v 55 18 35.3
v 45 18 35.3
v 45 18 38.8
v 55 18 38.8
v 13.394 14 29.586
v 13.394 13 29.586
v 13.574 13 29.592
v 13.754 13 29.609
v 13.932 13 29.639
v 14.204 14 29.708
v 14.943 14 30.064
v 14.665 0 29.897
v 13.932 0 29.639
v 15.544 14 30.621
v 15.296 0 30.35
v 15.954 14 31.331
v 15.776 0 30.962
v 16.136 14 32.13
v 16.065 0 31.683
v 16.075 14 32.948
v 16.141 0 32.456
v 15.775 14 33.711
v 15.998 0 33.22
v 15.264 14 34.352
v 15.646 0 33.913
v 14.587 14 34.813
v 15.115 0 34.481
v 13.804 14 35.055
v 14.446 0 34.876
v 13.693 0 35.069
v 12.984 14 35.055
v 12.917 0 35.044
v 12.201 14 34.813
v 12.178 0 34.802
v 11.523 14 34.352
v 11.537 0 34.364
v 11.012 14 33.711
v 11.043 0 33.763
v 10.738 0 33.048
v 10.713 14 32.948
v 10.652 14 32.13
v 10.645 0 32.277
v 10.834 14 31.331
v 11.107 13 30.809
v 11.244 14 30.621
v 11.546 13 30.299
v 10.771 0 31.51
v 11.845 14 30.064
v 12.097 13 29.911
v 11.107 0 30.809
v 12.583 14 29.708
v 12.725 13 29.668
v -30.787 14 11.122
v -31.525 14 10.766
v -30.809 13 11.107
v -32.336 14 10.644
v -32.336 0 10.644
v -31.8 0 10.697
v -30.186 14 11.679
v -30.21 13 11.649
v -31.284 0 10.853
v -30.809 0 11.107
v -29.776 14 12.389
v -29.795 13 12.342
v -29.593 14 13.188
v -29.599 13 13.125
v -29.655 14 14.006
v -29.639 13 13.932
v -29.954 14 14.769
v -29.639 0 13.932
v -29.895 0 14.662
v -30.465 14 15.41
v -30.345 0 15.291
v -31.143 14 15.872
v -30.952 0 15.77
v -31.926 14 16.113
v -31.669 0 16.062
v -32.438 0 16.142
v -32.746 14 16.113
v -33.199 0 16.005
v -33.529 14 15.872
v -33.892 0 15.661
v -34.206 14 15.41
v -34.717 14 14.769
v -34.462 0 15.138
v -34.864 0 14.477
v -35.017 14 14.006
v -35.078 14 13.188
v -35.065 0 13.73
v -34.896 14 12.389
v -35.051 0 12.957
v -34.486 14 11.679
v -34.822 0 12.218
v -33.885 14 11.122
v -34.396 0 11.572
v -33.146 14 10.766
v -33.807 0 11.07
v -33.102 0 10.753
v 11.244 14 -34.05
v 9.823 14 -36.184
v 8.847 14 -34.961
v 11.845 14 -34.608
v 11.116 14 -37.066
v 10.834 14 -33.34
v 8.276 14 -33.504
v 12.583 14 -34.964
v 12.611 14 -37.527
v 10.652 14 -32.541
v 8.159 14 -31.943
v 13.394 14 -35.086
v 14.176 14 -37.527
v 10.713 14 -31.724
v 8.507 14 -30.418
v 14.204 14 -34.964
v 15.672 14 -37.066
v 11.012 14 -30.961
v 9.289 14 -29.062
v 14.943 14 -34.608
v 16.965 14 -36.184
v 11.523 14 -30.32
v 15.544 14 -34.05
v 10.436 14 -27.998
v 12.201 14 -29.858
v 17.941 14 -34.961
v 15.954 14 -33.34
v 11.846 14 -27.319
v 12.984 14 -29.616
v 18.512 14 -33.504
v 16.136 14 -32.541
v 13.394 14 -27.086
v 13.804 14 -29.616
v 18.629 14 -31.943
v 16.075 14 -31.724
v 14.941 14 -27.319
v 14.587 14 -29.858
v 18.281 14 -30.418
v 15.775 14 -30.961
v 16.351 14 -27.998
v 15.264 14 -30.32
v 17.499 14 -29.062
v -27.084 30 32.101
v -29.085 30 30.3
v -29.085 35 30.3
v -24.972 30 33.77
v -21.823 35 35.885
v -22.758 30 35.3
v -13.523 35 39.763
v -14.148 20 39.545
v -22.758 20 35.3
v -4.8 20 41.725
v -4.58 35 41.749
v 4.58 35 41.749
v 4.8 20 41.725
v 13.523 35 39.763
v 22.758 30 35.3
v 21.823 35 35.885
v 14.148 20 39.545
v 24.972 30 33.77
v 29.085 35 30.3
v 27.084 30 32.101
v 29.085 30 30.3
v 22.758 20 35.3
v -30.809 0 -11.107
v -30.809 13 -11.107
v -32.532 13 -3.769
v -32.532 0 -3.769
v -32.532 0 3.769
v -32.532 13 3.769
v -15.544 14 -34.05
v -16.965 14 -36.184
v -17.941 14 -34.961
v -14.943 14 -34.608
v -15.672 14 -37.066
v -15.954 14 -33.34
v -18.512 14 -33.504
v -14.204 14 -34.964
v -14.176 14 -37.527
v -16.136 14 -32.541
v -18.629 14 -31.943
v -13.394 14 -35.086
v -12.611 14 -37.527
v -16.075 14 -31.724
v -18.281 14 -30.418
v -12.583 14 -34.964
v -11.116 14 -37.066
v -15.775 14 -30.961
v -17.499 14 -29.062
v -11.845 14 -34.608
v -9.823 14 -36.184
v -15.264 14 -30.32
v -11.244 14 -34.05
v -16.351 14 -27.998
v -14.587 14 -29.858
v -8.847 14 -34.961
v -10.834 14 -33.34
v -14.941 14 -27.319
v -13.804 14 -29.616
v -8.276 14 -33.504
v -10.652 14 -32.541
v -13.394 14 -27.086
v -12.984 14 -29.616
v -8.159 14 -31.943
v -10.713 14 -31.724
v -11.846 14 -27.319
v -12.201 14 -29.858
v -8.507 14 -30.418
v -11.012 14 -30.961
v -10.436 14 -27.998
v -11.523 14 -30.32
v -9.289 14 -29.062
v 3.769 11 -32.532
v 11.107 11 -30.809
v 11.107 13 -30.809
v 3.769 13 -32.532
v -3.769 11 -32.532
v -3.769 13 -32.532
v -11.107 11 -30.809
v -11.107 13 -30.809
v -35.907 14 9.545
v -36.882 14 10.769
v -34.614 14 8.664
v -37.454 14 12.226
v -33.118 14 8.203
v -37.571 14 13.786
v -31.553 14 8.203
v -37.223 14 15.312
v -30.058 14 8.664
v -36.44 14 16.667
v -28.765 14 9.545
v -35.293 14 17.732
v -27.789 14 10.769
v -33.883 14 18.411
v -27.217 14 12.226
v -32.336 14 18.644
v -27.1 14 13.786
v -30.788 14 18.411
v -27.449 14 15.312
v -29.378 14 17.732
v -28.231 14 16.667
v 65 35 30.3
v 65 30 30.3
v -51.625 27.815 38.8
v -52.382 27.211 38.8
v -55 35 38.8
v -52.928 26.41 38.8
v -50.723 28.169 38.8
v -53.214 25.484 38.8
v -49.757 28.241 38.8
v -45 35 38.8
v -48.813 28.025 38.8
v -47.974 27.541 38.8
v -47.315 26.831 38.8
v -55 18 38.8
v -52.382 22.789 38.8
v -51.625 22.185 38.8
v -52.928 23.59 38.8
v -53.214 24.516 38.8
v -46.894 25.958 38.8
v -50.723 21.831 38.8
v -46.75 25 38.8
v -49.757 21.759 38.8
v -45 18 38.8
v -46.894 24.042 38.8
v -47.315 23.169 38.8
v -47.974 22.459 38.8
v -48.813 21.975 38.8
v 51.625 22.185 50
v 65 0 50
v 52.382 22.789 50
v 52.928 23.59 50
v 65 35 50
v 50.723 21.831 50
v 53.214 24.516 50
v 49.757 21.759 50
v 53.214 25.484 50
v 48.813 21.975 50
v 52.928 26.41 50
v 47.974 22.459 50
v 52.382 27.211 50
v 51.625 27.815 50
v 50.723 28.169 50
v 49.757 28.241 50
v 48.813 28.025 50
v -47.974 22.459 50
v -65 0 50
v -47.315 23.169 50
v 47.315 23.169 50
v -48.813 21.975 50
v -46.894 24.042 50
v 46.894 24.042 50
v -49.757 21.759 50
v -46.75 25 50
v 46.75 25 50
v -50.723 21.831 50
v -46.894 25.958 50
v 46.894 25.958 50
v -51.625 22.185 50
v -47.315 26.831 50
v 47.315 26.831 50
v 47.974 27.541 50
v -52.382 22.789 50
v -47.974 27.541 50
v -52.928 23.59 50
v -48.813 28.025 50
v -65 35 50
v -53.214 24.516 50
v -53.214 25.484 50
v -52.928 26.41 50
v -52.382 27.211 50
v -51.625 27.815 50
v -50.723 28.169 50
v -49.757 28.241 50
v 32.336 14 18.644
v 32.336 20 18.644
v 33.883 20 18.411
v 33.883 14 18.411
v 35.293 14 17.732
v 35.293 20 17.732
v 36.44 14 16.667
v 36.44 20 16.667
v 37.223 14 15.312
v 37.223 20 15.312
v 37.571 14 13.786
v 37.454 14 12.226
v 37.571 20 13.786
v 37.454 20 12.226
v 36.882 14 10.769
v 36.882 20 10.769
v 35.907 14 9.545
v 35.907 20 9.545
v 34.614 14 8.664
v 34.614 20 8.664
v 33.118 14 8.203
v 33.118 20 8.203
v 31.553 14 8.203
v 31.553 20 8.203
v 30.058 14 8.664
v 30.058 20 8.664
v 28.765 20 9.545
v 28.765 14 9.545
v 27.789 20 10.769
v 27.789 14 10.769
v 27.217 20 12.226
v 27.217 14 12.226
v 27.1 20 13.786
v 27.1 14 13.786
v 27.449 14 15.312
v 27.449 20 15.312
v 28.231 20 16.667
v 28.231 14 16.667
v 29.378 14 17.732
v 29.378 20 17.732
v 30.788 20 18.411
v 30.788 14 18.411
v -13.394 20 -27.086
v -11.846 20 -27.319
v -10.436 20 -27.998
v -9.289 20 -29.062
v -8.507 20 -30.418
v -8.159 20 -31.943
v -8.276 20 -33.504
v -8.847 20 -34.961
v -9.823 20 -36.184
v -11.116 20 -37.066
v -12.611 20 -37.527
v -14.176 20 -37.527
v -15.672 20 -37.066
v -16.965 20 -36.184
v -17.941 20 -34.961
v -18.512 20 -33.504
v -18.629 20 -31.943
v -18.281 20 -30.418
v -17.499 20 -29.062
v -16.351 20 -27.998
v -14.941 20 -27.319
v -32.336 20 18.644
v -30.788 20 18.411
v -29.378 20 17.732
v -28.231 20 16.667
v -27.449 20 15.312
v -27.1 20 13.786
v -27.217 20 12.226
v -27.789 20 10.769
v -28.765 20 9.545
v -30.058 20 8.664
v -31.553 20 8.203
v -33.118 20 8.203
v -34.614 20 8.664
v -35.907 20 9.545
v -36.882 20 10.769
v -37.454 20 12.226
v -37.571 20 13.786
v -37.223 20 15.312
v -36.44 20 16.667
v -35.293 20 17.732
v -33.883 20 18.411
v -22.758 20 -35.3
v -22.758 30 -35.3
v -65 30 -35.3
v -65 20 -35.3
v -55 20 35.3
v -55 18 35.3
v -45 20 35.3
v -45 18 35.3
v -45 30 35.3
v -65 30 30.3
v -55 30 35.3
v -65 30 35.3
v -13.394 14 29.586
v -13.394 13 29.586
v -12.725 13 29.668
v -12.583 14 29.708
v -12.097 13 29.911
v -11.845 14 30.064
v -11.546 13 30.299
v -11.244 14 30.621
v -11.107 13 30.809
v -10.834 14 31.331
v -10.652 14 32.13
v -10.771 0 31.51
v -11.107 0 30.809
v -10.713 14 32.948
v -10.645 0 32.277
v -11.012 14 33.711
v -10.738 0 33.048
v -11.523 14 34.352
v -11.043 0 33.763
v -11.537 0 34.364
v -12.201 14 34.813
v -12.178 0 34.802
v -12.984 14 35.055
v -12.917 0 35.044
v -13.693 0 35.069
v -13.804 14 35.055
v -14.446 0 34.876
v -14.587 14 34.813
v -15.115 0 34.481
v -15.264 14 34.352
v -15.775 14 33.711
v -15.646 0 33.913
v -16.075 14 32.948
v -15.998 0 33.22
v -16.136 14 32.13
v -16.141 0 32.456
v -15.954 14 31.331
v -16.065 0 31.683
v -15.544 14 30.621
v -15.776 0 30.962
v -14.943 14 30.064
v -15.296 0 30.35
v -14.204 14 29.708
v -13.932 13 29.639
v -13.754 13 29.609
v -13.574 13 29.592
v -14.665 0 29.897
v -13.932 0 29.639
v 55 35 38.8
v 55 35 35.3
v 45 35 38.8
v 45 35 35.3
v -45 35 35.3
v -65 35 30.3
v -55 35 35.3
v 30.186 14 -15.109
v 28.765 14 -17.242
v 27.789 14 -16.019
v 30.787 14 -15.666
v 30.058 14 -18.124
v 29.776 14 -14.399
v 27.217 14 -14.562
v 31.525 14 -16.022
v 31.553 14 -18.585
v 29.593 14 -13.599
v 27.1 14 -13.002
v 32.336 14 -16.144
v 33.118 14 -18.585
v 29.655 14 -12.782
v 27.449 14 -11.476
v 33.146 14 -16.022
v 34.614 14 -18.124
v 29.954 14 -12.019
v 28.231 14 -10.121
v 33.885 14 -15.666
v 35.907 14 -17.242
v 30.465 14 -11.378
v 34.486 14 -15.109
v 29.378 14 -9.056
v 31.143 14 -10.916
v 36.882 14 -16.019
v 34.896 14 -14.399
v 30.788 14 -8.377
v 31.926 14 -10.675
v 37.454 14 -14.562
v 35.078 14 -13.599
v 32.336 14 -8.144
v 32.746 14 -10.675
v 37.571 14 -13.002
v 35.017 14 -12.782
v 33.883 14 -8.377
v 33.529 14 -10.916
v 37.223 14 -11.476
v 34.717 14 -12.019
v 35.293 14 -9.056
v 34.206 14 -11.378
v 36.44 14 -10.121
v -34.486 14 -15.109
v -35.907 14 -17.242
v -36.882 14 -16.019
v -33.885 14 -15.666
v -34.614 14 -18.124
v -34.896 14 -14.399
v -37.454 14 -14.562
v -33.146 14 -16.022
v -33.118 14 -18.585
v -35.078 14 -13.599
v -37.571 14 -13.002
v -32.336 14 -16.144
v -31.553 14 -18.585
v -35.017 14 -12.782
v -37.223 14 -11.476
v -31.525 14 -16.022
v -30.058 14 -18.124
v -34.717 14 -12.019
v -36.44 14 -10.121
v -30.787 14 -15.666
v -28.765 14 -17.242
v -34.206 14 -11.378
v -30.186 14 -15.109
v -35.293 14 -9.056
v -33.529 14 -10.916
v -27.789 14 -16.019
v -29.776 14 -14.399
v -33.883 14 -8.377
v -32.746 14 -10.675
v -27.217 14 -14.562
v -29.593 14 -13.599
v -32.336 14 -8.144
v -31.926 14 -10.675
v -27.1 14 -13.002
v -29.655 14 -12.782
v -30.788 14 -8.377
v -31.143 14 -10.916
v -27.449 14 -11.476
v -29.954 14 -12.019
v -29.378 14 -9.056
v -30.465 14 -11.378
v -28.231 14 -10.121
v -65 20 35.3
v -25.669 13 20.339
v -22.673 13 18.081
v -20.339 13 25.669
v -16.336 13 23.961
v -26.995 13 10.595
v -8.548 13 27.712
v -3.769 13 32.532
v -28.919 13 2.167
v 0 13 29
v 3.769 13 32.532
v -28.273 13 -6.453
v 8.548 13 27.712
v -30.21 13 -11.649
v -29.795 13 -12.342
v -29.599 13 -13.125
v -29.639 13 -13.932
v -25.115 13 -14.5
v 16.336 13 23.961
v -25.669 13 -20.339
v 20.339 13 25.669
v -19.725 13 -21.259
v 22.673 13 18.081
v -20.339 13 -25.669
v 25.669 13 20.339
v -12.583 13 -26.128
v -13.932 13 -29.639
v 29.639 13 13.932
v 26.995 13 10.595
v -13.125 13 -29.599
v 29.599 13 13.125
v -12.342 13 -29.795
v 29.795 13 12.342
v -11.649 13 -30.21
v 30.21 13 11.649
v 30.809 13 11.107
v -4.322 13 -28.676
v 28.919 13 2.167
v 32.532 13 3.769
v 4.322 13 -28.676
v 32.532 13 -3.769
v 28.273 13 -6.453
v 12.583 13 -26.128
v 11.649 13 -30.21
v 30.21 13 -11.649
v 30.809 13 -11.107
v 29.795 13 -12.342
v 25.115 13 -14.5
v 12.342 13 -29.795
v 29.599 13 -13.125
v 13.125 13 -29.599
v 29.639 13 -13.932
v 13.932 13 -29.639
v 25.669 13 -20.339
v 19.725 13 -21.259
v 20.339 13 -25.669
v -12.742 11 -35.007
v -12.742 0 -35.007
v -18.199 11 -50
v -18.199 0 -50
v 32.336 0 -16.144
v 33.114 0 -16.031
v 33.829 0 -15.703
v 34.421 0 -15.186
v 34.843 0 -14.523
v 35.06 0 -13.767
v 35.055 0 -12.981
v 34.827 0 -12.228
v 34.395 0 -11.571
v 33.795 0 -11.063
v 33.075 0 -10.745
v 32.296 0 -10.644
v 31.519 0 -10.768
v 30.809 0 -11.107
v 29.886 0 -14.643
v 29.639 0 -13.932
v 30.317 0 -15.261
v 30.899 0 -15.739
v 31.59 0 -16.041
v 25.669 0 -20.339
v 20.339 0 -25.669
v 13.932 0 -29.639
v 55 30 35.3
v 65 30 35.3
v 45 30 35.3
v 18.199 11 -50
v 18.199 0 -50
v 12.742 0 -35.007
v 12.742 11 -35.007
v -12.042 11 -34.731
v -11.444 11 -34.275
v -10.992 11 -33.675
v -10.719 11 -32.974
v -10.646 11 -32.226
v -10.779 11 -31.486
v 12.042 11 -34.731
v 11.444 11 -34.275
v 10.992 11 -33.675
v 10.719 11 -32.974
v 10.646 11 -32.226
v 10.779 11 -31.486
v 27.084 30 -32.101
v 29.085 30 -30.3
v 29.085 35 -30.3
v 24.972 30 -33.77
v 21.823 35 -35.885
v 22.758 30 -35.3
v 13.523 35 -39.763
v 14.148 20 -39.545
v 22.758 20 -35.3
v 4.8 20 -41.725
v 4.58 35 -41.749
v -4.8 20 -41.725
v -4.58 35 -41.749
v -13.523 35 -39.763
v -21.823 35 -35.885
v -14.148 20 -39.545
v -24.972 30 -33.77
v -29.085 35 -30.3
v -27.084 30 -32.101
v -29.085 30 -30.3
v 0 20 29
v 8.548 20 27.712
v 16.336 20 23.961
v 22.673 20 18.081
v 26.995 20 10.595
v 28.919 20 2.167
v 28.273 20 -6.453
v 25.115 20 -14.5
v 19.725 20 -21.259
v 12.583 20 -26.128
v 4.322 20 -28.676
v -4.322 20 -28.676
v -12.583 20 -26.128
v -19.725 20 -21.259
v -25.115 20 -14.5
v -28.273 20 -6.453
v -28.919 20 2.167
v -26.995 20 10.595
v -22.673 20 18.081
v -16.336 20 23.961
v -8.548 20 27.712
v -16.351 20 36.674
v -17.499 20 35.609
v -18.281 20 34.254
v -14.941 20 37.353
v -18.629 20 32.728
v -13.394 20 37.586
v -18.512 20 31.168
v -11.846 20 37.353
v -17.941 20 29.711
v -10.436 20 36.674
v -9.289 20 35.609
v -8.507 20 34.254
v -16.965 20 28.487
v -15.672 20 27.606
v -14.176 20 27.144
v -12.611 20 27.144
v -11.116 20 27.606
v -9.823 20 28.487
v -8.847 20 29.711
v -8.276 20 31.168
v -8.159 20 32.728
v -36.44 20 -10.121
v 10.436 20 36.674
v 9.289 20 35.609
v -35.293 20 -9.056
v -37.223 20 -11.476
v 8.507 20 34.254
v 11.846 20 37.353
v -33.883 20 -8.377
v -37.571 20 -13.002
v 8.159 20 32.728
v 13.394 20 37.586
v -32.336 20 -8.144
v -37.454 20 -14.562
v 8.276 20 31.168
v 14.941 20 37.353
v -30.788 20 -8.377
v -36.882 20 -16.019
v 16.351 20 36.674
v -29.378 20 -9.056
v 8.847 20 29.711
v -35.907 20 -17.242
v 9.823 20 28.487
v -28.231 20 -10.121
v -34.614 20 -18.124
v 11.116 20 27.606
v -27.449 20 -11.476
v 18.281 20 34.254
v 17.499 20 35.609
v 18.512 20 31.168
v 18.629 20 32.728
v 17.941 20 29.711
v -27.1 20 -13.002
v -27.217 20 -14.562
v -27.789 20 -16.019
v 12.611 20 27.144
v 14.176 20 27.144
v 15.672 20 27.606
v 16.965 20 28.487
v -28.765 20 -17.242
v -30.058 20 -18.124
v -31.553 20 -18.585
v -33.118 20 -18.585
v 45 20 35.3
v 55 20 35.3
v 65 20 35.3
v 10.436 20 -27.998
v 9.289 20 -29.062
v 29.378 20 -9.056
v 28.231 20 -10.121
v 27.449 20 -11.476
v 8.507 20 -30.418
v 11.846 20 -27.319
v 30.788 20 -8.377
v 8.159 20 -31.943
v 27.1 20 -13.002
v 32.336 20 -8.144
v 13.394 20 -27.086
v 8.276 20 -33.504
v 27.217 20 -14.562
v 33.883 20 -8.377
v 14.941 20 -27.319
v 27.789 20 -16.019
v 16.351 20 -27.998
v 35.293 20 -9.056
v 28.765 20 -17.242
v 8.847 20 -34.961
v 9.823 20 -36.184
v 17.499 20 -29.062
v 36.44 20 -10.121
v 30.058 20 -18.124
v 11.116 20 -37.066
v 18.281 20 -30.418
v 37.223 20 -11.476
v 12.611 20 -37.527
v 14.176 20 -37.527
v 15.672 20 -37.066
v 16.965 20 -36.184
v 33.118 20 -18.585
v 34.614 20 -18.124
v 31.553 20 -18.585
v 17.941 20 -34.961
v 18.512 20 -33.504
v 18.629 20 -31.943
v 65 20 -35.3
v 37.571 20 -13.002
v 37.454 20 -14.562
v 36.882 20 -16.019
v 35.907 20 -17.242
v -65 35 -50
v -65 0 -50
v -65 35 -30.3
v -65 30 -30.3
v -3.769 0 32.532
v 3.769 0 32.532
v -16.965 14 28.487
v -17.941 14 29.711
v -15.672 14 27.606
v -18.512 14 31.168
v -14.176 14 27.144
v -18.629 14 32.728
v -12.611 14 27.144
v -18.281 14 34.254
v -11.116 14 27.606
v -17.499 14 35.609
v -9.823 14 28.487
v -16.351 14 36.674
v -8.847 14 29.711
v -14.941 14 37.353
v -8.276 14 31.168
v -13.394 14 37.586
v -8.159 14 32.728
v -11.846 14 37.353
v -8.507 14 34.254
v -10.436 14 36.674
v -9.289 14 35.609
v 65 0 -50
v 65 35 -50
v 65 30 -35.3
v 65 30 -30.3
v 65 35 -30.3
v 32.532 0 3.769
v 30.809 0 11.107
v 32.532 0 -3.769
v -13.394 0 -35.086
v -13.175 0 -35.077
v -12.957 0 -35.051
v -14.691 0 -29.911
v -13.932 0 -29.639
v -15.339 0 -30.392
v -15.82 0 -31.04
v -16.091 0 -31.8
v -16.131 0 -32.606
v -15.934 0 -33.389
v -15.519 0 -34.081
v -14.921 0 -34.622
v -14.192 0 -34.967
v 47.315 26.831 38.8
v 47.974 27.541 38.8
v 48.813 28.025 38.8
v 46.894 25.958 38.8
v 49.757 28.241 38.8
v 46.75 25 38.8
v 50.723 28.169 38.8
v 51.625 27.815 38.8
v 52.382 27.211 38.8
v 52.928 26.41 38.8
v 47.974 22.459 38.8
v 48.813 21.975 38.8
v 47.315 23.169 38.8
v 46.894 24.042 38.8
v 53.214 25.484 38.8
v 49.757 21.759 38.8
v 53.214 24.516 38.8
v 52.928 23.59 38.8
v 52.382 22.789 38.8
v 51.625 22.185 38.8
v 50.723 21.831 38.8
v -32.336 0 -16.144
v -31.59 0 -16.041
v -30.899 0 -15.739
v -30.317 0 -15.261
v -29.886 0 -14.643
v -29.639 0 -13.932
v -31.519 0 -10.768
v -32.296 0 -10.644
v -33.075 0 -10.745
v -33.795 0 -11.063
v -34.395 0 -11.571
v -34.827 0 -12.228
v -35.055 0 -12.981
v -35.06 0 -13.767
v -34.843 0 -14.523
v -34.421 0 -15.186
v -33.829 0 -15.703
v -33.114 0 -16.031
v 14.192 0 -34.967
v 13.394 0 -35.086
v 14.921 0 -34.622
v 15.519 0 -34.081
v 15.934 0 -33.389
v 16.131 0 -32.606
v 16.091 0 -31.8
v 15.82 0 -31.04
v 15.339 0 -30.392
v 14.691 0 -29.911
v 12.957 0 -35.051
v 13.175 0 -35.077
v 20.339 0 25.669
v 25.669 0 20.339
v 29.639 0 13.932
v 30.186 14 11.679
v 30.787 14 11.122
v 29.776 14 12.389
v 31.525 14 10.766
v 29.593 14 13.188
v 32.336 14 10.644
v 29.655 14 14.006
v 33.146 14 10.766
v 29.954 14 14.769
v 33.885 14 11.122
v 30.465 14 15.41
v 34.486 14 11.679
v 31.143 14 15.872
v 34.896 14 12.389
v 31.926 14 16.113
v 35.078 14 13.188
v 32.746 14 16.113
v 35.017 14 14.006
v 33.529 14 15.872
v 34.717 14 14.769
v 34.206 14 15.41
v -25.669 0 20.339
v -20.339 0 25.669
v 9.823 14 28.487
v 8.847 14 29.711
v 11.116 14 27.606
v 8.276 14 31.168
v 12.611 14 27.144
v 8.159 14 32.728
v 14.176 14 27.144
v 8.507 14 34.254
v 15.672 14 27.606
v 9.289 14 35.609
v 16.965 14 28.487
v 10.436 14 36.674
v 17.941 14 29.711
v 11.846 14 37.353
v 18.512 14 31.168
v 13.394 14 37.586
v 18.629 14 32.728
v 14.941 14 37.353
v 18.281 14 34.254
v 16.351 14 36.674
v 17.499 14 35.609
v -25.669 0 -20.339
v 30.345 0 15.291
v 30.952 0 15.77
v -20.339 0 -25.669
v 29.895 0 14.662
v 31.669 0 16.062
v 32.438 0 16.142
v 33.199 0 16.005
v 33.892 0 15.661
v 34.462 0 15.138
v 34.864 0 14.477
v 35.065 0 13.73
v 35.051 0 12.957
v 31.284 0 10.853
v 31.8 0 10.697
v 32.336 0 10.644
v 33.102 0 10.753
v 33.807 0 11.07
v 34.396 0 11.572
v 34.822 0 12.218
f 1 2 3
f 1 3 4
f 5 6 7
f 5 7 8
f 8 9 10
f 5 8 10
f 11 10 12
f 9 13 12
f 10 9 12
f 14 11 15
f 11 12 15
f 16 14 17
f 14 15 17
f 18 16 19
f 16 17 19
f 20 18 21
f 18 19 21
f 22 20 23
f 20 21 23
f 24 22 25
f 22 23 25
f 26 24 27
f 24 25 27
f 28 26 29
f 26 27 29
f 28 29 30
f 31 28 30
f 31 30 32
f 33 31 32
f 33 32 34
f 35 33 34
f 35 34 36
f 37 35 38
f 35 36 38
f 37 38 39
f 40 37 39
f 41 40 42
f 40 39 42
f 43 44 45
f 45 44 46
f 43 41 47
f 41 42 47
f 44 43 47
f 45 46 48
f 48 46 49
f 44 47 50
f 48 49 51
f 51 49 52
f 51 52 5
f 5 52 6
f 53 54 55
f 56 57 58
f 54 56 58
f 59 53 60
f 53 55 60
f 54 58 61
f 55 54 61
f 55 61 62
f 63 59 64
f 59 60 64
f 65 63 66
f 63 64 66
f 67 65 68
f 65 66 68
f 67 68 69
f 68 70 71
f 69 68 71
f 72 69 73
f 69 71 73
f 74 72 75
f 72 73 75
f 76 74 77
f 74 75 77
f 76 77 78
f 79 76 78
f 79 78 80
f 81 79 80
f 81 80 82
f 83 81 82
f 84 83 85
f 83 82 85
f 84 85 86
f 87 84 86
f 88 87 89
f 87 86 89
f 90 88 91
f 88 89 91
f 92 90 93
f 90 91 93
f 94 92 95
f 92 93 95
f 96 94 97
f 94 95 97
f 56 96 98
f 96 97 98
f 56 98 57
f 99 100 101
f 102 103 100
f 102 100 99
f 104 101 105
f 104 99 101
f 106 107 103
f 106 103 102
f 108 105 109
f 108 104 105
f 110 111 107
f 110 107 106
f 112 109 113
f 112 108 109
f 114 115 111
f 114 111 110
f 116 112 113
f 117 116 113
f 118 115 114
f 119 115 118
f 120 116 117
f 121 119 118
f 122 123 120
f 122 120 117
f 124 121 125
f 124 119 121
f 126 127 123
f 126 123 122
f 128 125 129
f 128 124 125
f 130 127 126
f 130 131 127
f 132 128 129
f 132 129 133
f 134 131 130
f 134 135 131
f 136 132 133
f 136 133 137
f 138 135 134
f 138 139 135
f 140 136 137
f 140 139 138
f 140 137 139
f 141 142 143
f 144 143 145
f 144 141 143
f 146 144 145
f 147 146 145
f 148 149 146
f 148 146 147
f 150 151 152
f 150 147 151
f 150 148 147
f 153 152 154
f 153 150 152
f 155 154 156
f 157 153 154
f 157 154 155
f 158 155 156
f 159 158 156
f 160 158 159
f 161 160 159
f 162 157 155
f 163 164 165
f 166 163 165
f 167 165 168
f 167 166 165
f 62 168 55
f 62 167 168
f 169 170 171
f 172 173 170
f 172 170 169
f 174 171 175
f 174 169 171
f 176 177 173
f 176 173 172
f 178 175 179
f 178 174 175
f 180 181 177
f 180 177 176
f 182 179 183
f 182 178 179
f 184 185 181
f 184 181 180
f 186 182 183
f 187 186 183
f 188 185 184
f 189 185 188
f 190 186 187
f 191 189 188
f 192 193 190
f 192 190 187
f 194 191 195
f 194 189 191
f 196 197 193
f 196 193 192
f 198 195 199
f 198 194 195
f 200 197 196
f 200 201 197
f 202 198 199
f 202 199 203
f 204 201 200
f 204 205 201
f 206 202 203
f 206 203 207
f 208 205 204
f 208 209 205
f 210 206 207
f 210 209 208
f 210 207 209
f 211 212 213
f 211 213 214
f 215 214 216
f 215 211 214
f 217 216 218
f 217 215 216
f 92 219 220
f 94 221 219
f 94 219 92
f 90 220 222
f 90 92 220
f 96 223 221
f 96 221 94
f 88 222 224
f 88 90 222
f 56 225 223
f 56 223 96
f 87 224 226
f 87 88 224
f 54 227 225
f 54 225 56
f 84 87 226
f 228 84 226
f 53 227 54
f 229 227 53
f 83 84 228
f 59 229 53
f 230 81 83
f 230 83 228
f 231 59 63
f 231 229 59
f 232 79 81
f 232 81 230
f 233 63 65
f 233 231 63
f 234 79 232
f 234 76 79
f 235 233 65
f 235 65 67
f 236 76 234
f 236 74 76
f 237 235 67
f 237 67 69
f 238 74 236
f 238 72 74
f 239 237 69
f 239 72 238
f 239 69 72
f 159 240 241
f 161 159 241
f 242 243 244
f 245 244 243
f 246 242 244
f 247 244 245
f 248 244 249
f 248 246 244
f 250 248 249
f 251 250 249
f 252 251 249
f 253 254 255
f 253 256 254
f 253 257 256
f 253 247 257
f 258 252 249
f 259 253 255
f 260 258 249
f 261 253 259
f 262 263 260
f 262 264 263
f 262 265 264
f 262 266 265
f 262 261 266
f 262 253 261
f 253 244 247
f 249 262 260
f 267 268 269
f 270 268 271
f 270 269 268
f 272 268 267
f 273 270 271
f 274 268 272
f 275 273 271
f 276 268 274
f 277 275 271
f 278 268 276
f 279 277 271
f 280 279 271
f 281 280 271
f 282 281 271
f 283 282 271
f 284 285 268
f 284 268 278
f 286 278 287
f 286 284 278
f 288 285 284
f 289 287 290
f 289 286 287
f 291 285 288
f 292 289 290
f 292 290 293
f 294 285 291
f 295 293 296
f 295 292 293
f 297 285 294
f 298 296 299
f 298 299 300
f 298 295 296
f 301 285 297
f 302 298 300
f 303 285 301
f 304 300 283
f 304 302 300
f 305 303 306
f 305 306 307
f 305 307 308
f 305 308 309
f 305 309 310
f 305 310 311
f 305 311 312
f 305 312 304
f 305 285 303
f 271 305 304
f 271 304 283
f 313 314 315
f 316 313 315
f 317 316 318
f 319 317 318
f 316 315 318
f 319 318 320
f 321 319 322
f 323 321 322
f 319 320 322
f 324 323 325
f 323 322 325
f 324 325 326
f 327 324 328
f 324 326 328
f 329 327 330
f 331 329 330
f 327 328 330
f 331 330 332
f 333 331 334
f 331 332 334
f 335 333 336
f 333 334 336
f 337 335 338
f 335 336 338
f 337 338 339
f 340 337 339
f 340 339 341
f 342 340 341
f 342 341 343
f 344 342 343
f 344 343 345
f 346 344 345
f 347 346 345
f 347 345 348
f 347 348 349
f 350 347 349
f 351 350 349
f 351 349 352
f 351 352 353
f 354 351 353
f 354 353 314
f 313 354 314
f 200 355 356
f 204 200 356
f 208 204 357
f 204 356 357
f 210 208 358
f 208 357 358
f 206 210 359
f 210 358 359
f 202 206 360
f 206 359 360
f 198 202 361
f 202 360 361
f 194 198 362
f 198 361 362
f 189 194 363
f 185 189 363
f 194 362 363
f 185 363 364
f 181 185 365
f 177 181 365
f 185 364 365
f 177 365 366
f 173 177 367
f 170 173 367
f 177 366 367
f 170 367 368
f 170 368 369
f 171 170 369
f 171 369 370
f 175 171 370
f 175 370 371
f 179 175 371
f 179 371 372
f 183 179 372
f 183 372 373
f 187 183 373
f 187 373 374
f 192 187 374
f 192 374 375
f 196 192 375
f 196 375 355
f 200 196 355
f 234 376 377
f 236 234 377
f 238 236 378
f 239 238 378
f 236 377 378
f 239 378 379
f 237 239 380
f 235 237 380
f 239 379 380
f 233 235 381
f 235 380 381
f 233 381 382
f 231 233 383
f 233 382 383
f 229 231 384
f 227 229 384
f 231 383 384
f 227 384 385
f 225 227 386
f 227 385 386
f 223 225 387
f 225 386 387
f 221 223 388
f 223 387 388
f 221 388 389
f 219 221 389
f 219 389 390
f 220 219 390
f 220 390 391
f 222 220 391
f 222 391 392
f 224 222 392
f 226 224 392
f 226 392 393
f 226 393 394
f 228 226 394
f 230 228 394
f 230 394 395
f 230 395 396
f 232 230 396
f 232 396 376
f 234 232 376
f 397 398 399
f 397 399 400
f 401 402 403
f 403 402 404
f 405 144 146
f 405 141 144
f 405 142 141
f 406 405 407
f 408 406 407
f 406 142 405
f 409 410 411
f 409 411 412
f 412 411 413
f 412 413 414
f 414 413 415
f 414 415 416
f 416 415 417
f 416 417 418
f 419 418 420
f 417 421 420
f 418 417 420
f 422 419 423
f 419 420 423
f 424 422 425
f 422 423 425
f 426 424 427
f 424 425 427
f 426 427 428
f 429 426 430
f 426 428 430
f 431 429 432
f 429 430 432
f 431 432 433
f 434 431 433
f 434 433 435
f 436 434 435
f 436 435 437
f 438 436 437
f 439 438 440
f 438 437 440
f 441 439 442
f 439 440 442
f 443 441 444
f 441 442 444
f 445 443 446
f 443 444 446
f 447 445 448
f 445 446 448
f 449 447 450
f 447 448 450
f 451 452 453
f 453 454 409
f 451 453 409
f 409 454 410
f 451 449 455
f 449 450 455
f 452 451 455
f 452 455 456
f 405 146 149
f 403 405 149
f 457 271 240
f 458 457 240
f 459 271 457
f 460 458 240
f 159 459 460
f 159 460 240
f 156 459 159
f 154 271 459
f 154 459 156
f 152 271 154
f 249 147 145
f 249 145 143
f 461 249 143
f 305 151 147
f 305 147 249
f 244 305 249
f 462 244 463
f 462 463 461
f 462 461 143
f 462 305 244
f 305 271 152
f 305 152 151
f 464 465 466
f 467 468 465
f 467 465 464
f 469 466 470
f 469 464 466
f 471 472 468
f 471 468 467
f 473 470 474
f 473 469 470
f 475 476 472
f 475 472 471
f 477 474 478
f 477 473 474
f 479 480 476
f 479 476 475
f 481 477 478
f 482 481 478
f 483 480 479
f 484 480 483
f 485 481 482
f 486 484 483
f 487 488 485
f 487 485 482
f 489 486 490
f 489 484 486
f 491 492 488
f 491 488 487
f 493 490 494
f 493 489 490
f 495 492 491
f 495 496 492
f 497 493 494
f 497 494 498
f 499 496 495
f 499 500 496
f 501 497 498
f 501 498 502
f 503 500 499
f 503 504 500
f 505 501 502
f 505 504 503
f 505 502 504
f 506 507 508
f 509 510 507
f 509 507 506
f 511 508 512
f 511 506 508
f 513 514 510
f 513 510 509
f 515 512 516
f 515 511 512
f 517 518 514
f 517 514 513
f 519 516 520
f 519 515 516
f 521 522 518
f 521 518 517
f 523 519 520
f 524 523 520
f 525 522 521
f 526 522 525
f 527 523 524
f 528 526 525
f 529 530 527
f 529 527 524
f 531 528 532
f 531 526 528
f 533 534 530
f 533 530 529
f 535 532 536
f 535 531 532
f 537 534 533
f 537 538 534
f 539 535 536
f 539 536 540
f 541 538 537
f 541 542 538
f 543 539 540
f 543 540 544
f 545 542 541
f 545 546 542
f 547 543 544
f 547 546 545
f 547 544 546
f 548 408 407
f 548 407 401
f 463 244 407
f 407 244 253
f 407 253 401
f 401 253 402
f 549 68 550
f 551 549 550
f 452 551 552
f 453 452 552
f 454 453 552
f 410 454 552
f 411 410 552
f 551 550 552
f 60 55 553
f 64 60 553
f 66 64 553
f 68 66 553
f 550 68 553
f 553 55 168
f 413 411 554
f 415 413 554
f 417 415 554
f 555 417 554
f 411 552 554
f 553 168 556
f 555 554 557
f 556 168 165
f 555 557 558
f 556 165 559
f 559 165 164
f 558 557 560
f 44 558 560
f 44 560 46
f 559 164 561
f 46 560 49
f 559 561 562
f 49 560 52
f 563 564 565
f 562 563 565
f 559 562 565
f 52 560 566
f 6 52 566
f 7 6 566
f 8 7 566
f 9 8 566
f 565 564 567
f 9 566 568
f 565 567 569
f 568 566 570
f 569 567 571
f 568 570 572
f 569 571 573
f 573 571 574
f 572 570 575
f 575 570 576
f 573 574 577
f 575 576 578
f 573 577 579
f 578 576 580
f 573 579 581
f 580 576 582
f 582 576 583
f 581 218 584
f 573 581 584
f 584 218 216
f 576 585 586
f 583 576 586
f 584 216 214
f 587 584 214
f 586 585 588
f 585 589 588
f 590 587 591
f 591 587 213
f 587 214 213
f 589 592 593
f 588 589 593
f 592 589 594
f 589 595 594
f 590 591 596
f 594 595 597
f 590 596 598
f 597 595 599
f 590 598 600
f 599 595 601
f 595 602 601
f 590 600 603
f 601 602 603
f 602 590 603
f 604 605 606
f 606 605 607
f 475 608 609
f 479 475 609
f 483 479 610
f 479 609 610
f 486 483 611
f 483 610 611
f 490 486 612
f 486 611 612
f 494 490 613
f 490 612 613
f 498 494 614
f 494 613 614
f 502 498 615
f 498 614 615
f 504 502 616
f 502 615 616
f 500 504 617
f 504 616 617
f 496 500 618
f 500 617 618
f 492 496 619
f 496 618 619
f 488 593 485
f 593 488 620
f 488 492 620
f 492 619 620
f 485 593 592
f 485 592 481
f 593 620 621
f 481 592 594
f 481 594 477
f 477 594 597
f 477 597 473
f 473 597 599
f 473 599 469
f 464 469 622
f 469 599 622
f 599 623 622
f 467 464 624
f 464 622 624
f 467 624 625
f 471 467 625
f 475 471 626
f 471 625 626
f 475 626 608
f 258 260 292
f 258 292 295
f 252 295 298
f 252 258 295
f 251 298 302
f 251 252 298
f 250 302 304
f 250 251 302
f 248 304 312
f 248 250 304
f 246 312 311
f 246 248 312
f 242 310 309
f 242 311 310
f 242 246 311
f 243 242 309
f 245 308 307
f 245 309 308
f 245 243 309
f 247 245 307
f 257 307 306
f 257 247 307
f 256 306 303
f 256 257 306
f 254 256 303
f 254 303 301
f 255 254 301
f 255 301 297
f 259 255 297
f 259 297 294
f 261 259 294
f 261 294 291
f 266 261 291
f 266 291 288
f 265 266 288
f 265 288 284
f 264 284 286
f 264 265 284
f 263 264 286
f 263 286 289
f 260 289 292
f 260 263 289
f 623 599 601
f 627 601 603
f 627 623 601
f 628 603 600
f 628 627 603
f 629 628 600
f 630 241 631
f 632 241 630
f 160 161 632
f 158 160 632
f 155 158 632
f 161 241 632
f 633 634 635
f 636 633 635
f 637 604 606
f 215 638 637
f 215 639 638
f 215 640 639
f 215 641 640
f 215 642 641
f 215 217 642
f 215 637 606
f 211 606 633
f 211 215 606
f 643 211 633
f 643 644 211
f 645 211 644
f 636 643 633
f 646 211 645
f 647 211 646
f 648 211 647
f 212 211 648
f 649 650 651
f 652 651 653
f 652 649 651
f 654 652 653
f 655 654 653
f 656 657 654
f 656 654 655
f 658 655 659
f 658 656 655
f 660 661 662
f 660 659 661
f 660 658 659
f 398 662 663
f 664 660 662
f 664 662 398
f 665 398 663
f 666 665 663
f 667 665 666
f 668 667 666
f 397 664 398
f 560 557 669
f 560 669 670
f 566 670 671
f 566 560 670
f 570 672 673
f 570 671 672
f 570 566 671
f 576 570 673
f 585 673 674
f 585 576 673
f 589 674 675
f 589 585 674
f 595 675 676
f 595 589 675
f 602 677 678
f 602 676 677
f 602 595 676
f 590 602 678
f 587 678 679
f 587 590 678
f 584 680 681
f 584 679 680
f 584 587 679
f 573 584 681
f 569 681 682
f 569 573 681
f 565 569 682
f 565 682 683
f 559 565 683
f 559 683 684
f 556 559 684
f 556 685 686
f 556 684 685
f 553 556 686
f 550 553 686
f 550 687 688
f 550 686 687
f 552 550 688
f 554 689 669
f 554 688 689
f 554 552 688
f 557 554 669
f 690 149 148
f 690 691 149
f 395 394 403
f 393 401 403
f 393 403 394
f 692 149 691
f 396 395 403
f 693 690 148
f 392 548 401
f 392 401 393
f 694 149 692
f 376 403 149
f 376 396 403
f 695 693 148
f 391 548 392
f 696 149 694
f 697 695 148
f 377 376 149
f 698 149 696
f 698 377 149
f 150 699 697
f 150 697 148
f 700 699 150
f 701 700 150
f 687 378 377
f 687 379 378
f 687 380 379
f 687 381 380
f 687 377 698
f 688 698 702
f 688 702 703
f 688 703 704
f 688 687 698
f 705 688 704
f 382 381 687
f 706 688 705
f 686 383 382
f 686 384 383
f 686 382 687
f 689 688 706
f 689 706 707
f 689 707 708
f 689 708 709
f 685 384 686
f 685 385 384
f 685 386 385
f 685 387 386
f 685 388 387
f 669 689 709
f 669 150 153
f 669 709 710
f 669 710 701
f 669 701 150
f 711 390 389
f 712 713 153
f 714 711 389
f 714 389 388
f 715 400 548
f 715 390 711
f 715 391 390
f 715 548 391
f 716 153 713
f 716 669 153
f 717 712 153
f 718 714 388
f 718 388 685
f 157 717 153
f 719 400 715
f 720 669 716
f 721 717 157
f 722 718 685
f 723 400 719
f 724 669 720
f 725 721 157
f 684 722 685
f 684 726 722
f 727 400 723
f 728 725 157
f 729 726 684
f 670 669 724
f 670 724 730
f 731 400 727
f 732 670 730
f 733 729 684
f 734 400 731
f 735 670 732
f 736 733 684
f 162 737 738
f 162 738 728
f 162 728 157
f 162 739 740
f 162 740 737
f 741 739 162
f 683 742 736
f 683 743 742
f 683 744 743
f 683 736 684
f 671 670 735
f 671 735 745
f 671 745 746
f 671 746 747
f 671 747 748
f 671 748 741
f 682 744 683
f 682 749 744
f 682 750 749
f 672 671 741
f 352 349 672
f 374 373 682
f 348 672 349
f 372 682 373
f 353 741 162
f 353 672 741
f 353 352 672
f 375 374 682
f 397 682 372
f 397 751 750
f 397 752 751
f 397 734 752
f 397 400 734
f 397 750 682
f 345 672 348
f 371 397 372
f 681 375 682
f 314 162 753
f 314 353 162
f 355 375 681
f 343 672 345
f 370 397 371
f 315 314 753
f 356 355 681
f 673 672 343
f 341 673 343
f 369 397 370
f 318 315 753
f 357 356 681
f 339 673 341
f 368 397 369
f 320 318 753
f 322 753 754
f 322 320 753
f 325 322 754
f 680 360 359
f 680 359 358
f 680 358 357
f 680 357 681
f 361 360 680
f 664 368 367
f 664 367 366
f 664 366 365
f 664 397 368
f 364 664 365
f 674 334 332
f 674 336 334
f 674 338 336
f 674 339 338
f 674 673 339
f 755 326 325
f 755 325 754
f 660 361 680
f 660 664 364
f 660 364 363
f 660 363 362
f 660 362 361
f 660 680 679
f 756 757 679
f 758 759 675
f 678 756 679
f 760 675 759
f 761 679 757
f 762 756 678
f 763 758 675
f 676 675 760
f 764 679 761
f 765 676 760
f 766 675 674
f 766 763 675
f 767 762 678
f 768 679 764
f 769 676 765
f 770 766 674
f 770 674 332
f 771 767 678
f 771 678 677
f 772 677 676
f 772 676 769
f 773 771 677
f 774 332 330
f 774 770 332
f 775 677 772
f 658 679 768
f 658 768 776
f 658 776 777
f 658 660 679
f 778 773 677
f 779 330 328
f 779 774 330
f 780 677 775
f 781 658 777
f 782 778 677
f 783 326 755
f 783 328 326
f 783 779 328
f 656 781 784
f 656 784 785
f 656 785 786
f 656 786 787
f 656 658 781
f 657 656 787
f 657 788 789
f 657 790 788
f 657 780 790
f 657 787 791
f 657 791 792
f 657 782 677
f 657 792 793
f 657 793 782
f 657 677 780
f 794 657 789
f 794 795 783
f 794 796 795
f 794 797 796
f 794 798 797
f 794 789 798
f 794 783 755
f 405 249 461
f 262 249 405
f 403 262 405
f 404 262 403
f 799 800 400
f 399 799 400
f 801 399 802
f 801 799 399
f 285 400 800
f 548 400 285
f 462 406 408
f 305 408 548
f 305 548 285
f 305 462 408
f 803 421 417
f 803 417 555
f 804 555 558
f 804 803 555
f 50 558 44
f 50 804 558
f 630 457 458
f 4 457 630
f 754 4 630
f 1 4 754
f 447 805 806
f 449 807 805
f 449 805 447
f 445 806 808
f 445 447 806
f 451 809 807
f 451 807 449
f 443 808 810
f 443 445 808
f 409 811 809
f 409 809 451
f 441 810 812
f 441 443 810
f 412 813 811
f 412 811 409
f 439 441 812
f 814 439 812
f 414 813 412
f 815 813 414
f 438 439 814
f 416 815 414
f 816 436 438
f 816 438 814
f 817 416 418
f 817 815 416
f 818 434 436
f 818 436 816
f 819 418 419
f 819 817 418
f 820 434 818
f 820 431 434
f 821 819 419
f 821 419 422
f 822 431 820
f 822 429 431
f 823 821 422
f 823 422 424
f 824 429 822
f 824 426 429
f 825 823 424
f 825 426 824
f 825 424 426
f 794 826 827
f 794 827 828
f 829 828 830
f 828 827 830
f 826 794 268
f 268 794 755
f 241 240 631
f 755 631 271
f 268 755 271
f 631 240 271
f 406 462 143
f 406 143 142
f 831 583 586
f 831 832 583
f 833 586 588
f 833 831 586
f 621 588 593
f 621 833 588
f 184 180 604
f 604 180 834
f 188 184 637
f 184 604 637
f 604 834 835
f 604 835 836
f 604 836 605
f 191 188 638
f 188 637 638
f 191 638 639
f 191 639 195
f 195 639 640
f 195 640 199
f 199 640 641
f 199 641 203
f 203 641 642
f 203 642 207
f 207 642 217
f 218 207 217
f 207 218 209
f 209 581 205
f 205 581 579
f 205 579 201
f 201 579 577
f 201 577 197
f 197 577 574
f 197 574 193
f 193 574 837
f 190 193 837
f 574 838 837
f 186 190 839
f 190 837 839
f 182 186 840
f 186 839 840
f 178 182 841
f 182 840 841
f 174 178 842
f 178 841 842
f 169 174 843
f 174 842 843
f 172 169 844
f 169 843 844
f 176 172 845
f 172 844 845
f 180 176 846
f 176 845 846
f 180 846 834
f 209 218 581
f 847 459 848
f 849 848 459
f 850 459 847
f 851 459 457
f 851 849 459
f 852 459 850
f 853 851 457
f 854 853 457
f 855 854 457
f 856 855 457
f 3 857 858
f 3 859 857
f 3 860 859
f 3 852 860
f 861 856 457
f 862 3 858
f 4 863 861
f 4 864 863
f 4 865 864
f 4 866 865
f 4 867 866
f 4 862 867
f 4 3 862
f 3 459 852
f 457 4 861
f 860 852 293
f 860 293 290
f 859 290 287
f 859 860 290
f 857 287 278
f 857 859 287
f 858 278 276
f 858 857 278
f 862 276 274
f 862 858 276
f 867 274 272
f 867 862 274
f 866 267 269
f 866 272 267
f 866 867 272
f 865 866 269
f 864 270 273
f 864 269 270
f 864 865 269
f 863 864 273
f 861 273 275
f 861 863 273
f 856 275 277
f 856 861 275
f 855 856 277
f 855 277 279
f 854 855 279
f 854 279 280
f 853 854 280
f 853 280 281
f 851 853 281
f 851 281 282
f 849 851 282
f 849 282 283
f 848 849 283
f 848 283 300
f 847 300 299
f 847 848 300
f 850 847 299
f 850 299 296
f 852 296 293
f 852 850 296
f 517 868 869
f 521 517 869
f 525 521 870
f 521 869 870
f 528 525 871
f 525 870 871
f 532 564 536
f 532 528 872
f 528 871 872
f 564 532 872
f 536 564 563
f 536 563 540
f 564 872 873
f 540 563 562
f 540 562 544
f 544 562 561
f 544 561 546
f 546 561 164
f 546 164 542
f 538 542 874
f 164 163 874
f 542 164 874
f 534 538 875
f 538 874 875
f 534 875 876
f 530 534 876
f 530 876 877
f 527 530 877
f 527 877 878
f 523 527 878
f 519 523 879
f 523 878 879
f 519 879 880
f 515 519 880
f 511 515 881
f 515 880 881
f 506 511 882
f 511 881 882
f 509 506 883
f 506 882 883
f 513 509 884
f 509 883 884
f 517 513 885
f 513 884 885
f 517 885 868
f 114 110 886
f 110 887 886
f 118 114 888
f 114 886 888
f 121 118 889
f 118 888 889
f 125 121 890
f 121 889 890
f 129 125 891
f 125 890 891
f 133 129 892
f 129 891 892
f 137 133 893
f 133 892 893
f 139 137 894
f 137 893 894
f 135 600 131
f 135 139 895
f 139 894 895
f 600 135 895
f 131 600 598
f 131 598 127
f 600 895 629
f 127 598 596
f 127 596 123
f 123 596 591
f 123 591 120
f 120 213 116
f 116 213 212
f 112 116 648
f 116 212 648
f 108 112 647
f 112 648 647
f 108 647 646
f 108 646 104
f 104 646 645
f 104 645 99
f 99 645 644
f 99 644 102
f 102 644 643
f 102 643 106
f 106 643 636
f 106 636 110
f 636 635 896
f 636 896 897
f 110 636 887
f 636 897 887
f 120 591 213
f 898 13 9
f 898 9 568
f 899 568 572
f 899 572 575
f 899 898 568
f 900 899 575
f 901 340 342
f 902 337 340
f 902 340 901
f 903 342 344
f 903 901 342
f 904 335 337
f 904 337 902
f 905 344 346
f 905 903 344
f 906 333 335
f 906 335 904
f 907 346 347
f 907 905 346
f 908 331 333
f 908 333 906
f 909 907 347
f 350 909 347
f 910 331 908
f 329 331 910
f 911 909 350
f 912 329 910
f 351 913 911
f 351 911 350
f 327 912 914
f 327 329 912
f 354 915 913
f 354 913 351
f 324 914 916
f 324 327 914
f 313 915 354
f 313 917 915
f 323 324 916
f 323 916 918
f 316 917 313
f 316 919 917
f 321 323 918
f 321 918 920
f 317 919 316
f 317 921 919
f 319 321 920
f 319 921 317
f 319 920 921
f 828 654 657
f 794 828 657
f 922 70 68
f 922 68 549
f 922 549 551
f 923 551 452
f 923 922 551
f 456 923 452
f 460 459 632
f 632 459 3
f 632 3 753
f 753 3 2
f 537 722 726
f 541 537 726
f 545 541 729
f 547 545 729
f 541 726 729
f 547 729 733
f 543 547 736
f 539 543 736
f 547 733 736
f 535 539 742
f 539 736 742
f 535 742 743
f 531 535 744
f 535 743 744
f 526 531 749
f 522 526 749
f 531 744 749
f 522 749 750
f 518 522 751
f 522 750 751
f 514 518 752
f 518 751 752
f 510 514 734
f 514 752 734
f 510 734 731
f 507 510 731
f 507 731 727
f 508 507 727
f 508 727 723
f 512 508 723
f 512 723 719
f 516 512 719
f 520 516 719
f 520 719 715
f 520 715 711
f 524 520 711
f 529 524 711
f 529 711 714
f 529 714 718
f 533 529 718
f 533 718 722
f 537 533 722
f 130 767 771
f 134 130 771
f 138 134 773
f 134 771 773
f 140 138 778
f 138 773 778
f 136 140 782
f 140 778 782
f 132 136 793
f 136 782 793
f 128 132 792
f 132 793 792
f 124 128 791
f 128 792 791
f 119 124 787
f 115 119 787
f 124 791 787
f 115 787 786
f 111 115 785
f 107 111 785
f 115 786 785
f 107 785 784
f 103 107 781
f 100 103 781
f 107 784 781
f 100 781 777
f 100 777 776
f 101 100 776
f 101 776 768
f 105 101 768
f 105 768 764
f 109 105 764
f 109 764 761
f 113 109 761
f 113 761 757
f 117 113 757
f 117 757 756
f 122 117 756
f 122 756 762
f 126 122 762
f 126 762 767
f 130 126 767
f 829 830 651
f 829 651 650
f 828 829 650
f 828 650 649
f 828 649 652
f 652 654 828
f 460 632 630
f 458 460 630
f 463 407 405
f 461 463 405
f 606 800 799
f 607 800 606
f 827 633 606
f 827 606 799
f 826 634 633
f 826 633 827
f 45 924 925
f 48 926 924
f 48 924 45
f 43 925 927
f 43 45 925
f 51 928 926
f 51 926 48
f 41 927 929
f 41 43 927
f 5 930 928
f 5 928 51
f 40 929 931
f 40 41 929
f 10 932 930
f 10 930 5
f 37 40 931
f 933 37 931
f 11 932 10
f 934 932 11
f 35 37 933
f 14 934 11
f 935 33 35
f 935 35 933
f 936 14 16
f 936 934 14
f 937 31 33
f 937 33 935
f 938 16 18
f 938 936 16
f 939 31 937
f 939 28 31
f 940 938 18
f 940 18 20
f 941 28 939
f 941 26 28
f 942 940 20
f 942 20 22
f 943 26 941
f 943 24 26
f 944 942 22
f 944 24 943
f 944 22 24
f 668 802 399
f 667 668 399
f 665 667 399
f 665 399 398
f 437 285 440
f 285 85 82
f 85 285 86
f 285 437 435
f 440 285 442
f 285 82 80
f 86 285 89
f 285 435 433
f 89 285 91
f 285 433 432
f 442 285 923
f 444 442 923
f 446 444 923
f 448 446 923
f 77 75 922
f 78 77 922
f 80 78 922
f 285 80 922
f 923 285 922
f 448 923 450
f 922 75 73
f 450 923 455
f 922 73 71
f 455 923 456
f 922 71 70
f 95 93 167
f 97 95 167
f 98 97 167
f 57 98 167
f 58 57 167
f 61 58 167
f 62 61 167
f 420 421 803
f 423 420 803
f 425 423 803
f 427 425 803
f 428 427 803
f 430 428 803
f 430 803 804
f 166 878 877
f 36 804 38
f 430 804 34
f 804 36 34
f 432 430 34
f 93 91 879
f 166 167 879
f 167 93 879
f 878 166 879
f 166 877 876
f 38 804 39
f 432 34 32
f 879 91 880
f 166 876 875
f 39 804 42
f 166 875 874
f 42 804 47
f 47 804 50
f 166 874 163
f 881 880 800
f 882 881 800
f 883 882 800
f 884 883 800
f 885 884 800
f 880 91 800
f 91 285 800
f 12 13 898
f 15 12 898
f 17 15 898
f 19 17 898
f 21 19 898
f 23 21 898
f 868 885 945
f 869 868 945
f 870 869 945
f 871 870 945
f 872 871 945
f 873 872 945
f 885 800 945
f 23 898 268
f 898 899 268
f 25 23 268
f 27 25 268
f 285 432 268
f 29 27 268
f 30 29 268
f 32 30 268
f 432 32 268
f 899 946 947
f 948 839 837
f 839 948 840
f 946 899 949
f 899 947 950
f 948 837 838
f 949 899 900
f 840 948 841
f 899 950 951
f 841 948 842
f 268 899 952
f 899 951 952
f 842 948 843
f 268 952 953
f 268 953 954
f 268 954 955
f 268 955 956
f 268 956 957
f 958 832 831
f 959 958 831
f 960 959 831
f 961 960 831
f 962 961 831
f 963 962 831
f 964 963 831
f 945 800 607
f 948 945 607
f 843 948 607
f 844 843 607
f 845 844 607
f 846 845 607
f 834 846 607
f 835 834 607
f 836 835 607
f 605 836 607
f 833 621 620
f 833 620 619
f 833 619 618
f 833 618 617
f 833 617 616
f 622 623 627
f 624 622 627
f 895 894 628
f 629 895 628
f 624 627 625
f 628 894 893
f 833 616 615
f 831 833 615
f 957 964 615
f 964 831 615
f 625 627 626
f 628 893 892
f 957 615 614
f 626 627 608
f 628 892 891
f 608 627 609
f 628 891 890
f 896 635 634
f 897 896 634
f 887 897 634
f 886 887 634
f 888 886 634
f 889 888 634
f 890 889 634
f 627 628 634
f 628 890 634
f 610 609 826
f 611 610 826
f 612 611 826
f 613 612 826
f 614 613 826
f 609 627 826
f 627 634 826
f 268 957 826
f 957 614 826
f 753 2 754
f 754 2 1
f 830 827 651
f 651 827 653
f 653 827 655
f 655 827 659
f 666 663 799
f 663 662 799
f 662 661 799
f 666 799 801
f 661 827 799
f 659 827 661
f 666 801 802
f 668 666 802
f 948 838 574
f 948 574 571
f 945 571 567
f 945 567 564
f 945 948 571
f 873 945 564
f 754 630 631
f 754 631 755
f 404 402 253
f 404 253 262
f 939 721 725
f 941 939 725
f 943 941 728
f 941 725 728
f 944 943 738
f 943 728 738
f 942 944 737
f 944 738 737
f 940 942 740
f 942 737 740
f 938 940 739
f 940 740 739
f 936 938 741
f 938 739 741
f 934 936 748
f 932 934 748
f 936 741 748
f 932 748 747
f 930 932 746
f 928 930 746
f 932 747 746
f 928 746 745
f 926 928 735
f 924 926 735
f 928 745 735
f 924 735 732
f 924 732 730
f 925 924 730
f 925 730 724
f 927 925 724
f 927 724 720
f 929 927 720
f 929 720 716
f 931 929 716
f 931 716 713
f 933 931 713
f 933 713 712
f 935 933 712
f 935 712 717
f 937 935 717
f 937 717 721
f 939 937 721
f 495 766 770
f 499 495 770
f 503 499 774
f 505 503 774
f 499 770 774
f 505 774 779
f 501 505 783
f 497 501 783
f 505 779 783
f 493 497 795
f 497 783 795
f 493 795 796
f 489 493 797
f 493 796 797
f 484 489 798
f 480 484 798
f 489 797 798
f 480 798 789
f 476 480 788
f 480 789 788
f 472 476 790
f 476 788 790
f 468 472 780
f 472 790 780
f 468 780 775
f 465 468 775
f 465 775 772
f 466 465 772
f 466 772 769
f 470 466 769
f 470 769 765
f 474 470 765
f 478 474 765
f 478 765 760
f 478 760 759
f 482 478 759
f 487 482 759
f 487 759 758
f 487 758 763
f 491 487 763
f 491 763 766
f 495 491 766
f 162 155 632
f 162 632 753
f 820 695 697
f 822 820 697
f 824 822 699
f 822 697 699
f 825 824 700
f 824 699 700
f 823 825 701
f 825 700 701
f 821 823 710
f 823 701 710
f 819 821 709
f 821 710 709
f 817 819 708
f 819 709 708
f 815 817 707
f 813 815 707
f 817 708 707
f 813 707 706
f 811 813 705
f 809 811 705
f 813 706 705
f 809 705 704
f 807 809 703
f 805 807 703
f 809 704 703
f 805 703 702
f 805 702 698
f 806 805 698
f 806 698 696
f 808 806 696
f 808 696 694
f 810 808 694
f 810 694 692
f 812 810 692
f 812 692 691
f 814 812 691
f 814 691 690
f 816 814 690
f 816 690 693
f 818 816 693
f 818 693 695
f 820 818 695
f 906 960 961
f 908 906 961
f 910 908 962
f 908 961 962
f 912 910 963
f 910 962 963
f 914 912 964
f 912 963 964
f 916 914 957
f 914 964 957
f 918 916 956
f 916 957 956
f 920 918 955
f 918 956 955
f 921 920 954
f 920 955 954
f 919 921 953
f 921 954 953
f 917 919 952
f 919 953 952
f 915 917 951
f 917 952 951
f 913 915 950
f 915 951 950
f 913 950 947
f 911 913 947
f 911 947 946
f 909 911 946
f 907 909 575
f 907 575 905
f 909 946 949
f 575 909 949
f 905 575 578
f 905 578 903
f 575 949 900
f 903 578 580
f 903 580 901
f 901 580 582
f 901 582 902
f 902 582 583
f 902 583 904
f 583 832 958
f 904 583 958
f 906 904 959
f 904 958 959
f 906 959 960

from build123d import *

# Parameters (mm, degrees)
SKETCH1_W                               = 130
SKETCH1_H                               = 100
BOSS_EXTRUDE1_DEPTH                     = 20
CUT_EXTRUDE1_DEPTH                      = 85.409715081
CUT_EXTRUDE1_DEPTH_BACK                 = 85.409715081
SKETCH11_R                              = 29
CBORE_FOR_M5_HEX_HEAD_BOLT2_D           = 5.5
CBORE_FOR_M5_HEX_HEAD_BOLT2_CBORE_D     = 10.5
CBORE_FOR_M5_HEX_HEAD_BOLT2_CBORE_DEPTH = 6
SKETCH15_R                              = 32.75
CUT_EXTRUDE2_DEPTH                      = 13
BOSS_EXTRUDE2_DEPTH                     = 65
BOSS_EXTRUDE2_DEPTH_BACK                = 65
SKETCH17_R                              = 42
CUT_EXTRUDE3_DEPTH                      = 85.409715081
CUT_EXTRUDE4_DEPTH                      = 85.409715081
CUT_EXTRUDE4_DEPTH_BACK                 = 2
SKETCH18_W                              = 10
SKETCH18_H                              = 3.5
SKETCH19_R                              = 3.25
CUT_EXTRUDE5_DEPTH                      = 90.162772501
CUT_EXTRUDE7_DEPTH                      = 11


with BuildPart() as part:
    # Sketch1 → Boss-Extrude1 (new body)
    with BuildSketch(Plane(origin=(0, 0, 0), x_dir=(1, 0, 0), z_dir=(0, 1, 0))):
        Rectangle(SKETCH1_W, SKETCH1_H)
    extrude(amount=BOSS_EXTRUDE1_DEPTH)

    # Sketch11 → Cut-Extrude1 (cut, two sides: drawn at the far end of the back side and taken through both)
    with BuildSketch(Plane(origin=(0, 20, 0), x_dir=(1, 0, 0), z_dir=(0, 1, 0)).offset(-CUT_EXTRUDE1_DEPTH_BACK)):
        with Locations(Location((0, 0, 0), (0, 0, 270))):
            Circle(SKETCH11_R)
    extrude(amount=CUT_EXTRUDE1_DEPTH + CUT_EXTRUDE1_DEPTH_BACK, mode=Mode.SUBTRACT)

    # CBORE for M5 Hex Head Bolt2 (through all)
    with Locations(Plane(origin=(-32.335783638, 20, -13.393920133), x_dir=(0, 0, 1), z_dir=(0, 1, 0))):
        with Locations((0, 0), (-18.941863505, 18.941863505), (-18.941863505, 45.729703771), (0, 64.671567276), (26.787840266, 64.671567276), (45.729703771, 45.729703771), (45.729703771, 18.941863505), (26.787840266, 0)):
            CounterBoreHole(CBORE_FOR_M5_HEX_HEAD_BOLT2_D / 2, CBORE_FOR_M5_HEX_HEAD_BOLT2_CBORE_D / 2, CBORE_FOR_M5_HEX_HEAD_BOLT2_CBORE_DEPTH)

    # Sketch15 → Cut-Extrude2 (cut)
    with BuildSketch(Plane(origin=(0, 0, 0), x_dir=(1, 0, 0), z_dir=(0, 1, 0))):
        Circle(SKETCH15_R)
    extrude(amount=CUT_EXTRUDE2_DEPTH, mode=Mode.SUBTRACT)

    # Sketch16 → Boss-Extrude2 (add, two sides: drawn at the far end of the back side and taken through both)
    with BuildSketch(Plane(origin=(0, 0, 0), x_dir=(0, 0, -1), z_dir=(1, 0, 0)).offset(-BOSS_EXTRUDE2_DEPTH_BACK)):
        Polygon((-50, 20), (-50, 35), (-30.3, 35), (-30.3, 30), (-35.3, 30), (-35.3, 20), align=None)
        Polygon((30.3, 35), (30.3, 30), (35.3, 30), (35.3, 20), (50, 20), (50, 35), align=None)
    extrude(amount=BOSS_EXTRUDE2_DEPTH + BOSS_EXTRUDE2_DEPTH_BACK)

    # Sketch17 → Cut-Extrude3 (cut, through all)
    with BuildSketch(Plane(origin=(0, 20, 0), x_dir=(1, 0, 0), z_dir=(0, 1, 0))):
        Circle(SKETCH17_R)
    extrude(amount=CUT_EXTRUDE3_DEPTH, mode=Mode.SUBTRACT)

    # Sketch18 → Cut-Extrude4 (cut, two sides: drawn at the far end of the back side and taken through both)
    with BuildSketch(Plane(origin=(0, 20, 0), x_dir=(1, 0, 0), z_dir=(0, 1, 0)).offset(-CUT_EXTRUDE4_DEPTH_BACK)):
        with Locations((-50, -37.05)):
            Rectangle(SKETCH18_W, SKETCH18_H)
        with Locations((50, -37.05)):
            Rectangle(SKETCH18_W, SKETCH18_H)
    extrude(amount=CUT_EXTRUDE4_DEPTH + CUT_EXTRUDE4_DEPTH_BACK, mode=Mode.SUBTRACT)

    # Sketch19 → Cut-Extrude5 (cut, through all)
    with BuildSketch(Plane.XY):
        with Locations((-50, 25)):
            Circle(SKETCH19_R)
        with Locations(Location((50, 25, 0), (0, 0, 180))):
            Circle(SKETCH19_R)
    extrude(amount=CUT_EXTRUDE5_DEPTH, mode=Mode.SUBTRACT)

    # Sketch21 → Cut-Extrude7 (cut)
    with BuildSketch(Plane.XZ):
        Polygon((0, 0), (-20.393190362, -56.02983003), (20.393190362, -56.02983003), align=None)
    extrude(amount=-CUT_EXTRUDE7_DEPTH, mode=Mode.SUBTRACT)


solid = part.part
